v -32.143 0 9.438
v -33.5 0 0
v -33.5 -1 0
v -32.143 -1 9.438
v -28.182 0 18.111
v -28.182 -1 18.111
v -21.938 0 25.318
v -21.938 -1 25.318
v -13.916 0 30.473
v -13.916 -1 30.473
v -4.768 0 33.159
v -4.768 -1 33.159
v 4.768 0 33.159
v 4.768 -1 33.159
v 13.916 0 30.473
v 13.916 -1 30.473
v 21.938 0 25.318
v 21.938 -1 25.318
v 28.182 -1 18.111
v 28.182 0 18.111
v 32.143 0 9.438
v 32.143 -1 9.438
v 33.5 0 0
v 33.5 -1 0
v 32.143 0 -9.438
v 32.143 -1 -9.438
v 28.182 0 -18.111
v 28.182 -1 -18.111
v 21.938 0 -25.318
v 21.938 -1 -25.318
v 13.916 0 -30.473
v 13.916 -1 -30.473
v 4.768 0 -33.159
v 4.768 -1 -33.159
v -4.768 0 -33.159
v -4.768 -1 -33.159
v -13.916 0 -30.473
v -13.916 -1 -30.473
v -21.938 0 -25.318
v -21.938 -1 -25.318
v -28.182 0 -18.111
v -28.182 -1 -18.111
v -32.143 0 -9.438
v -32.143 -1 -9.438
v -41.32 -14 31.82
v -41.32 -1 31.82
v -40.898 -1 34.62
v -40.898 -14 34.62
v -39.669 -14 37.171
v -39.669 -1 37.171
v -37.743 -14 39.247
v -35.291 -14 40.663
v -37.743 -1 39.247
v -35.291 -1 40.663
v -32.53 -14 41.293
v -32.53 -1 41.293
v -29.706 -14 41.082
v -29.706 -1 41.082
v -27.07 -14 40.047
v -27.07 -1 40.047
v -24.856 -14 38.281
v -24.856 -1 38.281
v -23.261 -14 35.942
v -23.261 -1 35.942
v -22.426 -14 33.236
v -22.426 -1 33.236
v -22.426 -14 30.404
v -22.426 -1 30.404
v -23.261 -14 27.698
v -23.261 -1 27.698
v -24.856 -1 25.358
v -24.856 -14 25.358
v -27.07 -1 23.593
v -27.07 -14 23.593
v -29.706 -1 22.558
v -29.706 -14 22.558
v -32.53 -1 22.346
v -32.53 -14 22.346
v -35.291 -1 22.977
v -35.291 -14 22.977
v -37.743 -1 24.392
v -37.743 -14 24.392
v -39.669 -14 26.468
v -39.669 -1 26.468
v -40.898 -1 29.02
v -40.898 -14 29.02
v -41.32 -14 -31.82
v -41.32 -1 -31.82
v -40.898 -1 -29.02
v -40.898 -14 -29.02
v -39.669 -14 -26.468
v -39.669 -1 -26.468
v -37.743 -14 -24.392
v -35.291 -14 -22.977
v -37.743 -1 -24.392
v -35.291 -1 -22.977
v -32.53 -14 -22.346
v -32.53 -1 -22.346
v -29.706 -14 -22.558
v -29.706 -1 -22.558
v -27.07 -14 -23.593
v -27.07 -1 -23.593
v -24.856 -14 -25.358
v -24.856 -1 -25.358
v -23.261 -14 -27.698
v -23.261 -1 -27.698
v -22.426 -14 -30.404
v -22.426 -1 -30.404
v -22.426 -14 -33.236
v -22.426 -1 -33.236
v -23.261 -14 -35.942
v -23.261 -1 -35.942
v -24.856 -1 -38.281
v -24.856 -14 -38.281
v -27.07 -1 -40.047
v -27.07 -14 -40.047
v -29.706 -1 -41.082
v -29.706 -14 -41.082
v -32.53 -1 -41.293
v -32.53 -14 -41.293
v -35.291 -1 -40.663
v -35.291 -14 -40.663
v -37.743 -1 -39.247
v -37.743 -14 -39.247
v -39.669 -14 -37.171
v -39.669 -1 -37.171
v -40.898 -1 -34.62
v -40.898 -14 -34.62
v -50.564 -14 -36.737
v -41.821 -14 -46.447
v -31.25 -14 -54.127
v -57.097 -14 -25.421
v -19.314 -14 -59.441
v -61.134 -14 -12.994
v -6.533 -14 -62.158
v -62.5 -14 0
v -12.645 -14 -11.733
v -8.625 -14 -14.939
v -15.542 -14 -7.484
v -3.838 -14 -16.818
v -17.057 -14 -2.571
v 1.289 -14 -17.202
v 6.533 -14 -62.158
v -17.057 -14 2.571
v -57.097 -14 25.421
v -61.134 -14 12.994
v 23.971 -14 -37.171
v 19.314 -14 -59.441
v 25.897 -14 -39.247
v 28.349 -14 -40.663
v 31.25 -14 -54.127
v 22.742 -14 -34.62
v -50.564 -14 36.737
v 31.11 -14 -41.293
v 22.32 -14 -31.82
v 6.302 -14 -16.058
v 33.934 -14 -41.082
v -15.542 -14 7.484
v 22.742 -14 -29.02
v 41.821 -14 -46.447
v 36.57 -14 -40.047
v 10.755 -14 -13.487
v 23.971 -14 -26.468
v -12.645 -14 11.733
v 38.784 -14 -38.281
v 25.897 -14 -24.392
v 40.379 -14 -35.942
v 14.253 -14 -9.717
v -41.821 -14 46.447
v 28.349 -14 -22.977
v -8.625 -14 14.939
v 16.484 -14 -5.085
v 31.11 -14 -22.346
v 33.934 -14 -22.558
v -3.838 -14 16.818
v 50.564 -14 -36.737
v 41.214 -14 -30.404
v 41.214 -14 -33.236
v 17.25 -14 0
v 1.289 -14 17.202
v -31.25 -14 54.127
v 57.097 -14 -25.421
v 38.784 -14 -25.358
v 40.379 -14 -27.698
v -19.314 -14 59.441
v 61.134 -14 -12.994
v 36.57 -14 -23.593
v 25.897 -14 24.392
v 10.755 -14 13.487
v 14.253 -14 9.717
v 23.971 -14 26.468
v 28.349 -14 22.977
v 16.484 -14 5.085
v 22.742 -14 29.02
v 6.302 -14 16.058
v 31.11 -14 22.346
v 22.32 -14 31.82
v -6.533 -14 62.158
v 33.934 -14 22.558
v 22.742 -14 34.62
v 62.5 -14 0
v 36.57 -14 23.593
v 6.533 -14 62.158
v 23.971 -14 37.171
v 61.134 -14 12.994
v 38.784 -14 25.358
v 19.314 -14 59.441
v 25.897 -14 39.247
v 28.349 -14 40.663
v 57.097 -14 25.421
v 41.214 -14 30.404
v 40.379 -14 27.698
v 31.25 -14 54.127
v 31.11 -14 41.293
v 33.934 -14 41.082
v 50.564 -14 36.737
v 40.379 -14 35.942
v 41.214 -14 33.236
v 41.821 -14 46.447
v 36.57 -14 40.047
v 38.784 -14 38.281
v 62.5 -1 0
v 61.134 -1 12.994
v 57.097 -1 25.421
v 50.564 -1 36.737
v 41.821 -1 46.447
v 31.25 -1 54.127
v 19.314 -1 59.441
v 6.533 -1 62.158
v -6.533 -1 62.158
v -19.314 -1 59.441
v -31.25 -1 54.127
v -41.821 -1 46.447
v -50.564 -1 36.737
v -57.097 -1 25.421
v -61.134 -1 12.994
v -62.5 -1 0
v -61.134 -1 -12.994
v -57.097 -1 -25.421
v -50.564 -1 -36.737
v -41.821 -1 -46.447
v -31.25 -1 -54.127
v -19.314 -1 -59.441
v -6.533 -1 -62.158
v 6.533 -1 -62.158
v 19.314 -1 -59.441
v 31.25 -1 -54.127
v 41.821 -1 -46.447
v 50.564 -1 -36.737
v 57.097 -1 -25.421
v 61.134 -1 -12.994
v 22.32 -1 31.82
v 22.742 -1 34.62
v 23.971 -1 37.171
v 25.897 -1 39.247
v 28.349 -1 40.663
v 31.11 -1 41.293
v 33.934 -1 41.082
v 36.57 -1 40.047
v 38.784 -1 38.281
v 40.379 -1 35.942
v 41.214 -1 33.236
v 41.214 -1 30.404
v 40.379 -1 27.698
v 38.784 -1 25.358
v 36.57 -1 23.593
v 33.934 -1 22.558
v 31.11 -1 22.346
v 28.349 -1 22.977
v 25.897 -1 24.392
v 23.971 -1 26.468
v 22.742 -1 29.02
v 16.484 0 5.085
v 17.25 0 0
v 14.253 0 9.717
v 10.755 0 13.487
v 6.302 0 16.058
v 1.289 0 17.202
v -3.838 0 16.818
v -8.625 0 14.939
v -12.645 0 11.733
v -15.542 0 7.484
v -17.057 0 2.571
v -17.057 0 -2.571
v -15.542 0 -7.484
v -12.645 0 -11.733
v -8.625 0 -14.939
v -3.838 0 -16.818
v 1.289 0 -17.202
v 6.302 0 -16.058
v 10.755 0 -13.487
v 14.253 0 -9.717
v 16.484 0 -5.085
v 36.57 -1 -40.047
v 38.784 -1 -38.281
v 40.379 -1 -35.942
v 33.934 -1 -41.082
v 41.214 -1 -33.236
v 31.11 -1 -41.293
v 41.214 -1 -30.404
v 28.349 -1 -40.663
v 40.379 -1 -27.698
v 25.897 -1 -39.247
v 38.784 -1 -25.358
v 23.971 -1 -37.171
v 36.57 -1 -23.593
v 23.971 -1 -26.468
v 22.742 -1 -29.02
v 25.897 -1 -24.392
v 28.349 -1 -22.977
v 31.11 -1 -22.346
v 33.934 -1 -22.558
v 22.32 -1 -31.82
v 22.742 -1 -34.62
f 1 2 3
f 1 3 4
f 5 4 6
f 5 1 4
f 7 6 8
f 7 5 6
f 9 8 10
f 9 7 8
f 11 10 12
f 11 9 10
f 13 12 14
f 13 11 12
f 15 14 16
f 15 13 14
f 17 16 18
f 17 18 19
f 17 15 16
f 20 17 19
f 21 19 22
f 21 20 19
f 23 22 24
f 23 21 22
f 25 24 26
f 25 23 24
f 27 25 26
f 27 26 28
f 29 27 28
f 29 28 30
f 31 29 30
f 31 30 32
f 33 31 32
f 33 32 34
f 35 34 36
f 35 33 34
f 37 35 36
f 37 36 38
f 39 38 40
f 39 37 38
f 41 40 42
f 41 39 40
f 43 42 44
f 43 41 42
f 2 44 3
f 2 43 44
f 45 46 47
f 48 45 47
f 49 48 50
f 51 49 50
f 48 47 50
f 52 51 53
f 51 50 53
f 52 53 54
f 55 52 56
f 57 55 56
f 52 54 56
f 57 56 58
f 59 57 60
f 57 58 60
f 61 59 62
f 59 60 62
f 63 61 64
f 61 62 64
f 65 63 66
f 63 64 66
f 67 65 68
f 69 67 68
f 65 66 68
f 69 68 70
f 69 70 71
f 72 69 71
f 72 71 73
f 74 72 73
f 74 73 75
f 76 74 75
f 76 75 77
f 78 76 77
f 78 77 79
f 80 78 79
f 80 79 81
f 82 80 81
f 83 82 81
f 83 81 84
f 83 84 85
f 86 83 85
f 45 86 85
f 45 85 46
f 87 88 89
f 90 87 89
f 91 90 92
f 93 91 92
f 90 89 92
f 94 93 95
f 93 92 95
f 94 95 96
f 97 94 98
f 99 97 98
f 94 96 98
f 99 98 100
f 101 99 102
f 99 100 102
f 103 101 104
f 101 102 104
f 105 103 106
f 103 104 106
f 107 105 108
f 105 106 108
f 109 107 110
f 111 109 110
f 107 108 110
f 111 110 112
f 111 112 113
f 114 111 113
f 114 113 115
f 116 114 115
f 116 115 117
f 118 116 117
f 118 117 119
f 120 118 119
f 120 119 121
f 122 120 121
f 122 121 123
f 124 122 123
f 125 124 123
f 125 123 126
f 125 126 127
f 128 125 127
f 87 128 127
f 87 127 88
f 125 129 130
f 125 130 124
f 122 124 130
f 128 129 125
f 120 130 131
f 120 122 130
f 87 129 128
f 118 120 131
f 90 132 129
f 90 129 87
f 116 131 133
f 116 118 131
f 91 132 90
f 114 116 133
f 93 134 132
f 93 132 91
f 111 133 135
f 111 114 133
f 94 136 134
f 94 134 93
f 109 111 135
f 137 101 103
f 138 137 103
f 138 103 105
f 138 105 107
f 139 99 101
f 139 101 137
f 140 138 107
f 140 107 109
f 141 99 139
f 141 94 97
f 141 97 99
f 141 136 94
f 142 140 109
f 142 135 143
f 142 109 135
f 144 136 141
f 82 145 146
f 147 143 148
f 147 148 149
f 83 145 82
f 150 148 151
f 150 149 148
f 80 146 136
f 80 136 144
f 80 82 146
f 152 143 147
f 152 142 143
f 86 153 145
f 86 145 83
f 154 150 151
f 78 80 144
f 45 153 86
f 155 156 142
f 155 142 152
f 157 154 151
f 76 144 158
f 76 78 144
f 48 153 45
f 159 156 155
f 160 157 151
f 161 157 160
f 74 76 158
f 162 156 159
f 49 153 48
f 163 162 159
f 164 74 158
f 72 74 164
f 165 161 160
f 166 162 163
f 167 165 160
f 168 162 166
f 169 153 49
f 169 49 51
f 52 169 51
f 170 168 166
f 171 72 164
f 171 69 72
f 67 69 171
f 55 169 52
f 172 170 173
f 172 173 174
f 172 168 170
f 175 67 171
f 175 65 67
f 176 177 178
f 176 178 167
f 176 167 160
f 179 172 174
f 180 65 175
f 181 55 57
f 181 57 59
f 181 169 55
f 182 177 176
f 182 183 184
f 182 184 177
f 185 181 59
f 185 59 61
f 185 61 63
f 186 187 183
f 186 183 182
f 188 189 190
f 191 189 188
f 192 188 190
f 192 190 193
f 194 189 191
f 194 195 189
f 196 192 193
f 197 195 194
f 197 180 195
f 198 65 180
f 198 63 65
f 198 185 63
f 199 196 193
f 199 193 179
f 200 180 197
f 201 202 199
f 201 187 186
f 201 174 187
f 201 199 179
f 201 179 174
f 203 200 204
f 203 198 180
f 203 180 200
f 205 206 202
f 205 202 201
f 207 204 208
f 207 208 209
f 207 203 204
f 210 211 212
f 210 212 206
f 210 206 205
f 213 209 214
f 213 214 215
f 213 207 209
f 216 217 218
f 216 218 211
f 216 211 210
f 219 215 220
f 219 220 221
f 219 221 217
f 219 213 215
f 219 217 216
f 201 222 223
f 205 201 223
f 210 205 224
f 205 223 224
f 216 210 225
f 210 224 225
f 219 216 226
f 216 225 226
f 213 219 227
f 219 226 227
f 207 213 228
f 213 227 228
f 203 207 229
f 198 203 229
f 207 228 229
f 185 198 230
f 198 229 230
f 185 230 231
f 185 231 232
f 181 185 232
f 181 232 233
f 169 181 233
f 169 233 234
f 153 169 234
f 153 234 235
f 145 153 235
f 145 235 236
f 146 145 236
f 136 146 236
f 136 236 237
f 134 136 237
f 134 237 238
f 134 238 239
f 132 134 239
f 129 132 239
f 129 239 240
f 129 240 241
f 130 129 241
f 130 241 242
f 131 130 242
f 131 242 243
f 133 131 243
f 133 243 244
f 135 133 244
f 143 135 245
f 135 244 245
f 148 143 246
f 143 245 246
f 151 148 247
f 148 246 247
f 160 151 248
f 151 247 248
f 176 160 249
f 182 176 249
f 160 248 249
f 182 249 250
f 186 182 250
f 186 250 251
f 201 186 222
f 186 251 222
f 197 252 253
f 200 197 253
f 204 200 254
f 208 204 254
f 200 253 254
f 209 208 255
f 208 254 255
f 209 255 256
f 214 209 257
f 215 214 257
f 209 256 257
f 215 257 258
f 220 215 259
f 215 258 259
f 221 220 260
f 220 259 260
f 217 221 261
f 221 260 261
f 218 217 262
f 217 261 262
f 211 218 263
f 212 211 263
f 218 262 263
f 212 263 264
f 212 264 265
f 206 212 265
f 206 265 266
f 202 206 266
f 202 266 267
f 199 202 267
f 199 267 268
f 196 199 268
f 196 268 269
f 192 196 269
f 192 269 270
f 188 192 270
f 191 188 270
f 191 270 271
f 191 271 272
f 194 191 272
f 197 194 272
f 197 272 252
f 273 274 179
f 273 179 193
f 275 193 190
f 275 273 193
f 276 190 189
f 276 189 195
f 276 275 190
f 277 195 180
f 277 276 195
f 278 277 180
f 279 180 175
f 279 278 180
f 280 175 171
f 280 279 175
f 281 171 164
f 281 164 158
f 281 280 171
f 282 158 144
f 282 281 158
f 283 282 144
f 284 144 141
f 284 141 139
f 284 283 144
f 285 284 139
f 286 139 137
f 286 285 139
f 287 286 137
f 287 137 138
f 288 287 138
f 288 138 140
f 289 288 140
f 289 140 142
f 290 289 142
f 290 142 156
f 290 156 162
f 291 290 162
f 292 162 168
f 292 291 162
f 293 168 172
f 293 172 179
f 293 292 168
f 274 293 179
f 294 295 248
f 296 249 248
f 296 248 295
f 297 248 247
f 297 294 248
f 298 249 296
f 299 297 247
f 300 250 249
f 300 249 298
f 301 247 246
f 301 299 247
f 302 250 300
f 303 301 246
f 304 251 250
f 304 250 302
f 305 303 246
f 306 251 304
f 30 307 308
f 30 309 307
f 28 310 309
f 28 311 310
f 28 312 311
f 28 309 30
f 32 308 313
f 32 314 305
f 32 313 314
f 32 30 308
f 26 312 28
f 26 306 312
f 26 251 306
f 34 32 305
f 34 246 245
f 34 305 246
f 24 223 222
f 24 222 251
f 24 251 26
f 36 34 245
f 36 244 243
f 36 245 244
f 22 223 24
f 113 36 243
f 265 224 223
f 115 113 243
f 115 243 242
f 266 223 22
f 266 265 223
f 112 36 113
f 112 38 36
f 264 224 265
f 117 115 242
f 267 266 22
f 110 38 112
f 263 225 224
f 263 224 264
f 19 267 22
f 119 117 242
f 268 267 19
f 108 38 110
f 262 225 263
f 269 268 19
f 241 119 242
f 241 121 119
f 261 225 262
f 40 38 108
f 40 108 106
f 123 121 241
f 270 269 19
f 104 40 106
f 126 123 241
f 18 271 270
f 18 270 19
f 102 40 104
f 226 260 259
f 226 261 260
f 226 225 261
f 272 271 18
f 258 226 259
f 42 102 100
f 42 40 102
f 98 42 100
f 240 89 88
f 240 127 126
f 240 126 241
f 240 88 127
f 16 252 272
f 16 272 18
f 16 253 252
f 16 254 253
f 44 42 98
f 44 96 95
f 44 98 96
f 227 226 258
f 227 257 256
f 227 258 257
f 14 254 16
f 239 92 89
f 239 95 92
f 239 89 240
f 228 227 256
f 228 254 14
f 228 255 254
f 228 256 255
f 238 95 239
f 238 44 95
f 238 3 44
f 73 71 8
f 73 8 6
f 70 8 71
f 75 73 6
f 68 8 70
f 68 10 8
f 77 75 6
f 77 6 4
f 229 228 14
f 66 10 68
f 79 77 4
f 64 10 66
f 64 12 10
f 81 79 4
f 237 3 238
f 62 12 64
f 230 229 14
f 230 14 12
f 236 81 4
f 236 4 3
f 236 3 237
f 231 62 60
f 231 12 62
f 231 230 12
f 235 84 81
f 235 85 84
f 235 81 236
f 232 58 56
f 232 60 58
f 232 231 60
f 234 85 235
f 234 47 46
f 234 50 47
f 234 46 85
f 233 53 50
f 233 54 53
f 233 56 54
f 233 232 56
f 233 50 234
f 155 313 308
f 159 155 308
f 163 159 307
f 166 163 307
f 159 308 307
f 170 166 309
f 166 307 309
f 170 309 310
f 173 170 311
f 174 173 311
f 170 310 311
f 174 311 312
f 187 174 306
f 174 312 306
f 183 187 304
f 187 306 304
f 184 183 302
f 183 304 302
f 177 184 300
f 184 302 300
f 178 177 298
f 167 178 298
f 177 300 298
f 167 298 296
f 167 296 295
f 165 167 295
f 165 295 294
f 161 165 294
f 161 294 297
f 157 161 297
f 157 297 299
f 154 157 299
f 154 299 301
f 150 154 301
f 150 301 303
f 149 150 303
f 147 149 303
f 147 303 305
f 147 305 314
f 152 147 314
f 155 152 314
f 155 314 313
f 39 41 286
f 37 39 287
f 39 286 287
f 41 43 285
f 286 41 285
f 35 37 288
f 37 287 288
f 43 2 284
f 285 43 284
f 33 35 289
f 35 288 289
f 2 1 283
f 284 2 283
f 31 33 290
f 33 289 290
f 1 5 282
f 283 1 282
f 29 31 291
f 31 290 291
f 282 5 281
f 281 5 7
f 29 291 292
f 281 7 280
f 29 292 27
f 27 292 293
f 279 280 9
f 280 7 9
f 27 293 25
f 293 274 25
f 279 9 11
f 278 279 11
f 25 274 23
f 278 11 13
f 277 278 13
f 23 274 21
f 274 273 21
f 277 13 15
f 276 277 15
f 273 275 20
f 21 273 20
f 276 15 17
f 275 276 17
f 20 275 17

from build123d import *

# Parameters (mm, degrees)
F0_R     = 62.5
F0_R_2   = 17.25
F1_DEPTH = 14
F2_R     = 62.5
F2_R_2   = 33.5
F3_DEPTH = 1
F4_R     = 9.5
F5_DEPTH = 14.001


with BuildPart() as f1:
    # F0 (on Front) → F1 (new body)
    with BuildSketch(Plane.XZ):
        Circle(F0_R)
        Circle(F0_R_2, mode=Mode.SUBTRACT)
    extrude(amount=F1_DEPTH)

    # F2 (on face) → F3 (cut)
    with BuildSketch(Plane(origin=(0, 0, 0), x_dir=(-1, 0, 0), z_dir=(0, 1, 0))):
        Circle(F2_R)
        Circle(F2_R_2, mode=Mode.SUBTRACT)
    extrude(amount=-F3_DEPTH, mode=Mode.SUBTRACT)

    # F4 (on face) → F5 (cut, through all)
    with BuildSketch(Plane(origin=(0, 0, 0), x_dir=(-1, 0, 0), z_dir=(0, 1, 0))):
        with Locations((-31.819805, 31.819805)):
            Circle(F4_R)
        with Locations((-31.819805, -31.819805)):
            Circle(F4_R)
        with Locations((31.819805, -31.819805)):
            Circle(F4_R)
        with Locations((31.819805, 31.819805)):
            Circle(F4_R)
    extrude(amount=-F5_DEPTH, mode=Mode.SUBTRACT)


solid = f1.part
